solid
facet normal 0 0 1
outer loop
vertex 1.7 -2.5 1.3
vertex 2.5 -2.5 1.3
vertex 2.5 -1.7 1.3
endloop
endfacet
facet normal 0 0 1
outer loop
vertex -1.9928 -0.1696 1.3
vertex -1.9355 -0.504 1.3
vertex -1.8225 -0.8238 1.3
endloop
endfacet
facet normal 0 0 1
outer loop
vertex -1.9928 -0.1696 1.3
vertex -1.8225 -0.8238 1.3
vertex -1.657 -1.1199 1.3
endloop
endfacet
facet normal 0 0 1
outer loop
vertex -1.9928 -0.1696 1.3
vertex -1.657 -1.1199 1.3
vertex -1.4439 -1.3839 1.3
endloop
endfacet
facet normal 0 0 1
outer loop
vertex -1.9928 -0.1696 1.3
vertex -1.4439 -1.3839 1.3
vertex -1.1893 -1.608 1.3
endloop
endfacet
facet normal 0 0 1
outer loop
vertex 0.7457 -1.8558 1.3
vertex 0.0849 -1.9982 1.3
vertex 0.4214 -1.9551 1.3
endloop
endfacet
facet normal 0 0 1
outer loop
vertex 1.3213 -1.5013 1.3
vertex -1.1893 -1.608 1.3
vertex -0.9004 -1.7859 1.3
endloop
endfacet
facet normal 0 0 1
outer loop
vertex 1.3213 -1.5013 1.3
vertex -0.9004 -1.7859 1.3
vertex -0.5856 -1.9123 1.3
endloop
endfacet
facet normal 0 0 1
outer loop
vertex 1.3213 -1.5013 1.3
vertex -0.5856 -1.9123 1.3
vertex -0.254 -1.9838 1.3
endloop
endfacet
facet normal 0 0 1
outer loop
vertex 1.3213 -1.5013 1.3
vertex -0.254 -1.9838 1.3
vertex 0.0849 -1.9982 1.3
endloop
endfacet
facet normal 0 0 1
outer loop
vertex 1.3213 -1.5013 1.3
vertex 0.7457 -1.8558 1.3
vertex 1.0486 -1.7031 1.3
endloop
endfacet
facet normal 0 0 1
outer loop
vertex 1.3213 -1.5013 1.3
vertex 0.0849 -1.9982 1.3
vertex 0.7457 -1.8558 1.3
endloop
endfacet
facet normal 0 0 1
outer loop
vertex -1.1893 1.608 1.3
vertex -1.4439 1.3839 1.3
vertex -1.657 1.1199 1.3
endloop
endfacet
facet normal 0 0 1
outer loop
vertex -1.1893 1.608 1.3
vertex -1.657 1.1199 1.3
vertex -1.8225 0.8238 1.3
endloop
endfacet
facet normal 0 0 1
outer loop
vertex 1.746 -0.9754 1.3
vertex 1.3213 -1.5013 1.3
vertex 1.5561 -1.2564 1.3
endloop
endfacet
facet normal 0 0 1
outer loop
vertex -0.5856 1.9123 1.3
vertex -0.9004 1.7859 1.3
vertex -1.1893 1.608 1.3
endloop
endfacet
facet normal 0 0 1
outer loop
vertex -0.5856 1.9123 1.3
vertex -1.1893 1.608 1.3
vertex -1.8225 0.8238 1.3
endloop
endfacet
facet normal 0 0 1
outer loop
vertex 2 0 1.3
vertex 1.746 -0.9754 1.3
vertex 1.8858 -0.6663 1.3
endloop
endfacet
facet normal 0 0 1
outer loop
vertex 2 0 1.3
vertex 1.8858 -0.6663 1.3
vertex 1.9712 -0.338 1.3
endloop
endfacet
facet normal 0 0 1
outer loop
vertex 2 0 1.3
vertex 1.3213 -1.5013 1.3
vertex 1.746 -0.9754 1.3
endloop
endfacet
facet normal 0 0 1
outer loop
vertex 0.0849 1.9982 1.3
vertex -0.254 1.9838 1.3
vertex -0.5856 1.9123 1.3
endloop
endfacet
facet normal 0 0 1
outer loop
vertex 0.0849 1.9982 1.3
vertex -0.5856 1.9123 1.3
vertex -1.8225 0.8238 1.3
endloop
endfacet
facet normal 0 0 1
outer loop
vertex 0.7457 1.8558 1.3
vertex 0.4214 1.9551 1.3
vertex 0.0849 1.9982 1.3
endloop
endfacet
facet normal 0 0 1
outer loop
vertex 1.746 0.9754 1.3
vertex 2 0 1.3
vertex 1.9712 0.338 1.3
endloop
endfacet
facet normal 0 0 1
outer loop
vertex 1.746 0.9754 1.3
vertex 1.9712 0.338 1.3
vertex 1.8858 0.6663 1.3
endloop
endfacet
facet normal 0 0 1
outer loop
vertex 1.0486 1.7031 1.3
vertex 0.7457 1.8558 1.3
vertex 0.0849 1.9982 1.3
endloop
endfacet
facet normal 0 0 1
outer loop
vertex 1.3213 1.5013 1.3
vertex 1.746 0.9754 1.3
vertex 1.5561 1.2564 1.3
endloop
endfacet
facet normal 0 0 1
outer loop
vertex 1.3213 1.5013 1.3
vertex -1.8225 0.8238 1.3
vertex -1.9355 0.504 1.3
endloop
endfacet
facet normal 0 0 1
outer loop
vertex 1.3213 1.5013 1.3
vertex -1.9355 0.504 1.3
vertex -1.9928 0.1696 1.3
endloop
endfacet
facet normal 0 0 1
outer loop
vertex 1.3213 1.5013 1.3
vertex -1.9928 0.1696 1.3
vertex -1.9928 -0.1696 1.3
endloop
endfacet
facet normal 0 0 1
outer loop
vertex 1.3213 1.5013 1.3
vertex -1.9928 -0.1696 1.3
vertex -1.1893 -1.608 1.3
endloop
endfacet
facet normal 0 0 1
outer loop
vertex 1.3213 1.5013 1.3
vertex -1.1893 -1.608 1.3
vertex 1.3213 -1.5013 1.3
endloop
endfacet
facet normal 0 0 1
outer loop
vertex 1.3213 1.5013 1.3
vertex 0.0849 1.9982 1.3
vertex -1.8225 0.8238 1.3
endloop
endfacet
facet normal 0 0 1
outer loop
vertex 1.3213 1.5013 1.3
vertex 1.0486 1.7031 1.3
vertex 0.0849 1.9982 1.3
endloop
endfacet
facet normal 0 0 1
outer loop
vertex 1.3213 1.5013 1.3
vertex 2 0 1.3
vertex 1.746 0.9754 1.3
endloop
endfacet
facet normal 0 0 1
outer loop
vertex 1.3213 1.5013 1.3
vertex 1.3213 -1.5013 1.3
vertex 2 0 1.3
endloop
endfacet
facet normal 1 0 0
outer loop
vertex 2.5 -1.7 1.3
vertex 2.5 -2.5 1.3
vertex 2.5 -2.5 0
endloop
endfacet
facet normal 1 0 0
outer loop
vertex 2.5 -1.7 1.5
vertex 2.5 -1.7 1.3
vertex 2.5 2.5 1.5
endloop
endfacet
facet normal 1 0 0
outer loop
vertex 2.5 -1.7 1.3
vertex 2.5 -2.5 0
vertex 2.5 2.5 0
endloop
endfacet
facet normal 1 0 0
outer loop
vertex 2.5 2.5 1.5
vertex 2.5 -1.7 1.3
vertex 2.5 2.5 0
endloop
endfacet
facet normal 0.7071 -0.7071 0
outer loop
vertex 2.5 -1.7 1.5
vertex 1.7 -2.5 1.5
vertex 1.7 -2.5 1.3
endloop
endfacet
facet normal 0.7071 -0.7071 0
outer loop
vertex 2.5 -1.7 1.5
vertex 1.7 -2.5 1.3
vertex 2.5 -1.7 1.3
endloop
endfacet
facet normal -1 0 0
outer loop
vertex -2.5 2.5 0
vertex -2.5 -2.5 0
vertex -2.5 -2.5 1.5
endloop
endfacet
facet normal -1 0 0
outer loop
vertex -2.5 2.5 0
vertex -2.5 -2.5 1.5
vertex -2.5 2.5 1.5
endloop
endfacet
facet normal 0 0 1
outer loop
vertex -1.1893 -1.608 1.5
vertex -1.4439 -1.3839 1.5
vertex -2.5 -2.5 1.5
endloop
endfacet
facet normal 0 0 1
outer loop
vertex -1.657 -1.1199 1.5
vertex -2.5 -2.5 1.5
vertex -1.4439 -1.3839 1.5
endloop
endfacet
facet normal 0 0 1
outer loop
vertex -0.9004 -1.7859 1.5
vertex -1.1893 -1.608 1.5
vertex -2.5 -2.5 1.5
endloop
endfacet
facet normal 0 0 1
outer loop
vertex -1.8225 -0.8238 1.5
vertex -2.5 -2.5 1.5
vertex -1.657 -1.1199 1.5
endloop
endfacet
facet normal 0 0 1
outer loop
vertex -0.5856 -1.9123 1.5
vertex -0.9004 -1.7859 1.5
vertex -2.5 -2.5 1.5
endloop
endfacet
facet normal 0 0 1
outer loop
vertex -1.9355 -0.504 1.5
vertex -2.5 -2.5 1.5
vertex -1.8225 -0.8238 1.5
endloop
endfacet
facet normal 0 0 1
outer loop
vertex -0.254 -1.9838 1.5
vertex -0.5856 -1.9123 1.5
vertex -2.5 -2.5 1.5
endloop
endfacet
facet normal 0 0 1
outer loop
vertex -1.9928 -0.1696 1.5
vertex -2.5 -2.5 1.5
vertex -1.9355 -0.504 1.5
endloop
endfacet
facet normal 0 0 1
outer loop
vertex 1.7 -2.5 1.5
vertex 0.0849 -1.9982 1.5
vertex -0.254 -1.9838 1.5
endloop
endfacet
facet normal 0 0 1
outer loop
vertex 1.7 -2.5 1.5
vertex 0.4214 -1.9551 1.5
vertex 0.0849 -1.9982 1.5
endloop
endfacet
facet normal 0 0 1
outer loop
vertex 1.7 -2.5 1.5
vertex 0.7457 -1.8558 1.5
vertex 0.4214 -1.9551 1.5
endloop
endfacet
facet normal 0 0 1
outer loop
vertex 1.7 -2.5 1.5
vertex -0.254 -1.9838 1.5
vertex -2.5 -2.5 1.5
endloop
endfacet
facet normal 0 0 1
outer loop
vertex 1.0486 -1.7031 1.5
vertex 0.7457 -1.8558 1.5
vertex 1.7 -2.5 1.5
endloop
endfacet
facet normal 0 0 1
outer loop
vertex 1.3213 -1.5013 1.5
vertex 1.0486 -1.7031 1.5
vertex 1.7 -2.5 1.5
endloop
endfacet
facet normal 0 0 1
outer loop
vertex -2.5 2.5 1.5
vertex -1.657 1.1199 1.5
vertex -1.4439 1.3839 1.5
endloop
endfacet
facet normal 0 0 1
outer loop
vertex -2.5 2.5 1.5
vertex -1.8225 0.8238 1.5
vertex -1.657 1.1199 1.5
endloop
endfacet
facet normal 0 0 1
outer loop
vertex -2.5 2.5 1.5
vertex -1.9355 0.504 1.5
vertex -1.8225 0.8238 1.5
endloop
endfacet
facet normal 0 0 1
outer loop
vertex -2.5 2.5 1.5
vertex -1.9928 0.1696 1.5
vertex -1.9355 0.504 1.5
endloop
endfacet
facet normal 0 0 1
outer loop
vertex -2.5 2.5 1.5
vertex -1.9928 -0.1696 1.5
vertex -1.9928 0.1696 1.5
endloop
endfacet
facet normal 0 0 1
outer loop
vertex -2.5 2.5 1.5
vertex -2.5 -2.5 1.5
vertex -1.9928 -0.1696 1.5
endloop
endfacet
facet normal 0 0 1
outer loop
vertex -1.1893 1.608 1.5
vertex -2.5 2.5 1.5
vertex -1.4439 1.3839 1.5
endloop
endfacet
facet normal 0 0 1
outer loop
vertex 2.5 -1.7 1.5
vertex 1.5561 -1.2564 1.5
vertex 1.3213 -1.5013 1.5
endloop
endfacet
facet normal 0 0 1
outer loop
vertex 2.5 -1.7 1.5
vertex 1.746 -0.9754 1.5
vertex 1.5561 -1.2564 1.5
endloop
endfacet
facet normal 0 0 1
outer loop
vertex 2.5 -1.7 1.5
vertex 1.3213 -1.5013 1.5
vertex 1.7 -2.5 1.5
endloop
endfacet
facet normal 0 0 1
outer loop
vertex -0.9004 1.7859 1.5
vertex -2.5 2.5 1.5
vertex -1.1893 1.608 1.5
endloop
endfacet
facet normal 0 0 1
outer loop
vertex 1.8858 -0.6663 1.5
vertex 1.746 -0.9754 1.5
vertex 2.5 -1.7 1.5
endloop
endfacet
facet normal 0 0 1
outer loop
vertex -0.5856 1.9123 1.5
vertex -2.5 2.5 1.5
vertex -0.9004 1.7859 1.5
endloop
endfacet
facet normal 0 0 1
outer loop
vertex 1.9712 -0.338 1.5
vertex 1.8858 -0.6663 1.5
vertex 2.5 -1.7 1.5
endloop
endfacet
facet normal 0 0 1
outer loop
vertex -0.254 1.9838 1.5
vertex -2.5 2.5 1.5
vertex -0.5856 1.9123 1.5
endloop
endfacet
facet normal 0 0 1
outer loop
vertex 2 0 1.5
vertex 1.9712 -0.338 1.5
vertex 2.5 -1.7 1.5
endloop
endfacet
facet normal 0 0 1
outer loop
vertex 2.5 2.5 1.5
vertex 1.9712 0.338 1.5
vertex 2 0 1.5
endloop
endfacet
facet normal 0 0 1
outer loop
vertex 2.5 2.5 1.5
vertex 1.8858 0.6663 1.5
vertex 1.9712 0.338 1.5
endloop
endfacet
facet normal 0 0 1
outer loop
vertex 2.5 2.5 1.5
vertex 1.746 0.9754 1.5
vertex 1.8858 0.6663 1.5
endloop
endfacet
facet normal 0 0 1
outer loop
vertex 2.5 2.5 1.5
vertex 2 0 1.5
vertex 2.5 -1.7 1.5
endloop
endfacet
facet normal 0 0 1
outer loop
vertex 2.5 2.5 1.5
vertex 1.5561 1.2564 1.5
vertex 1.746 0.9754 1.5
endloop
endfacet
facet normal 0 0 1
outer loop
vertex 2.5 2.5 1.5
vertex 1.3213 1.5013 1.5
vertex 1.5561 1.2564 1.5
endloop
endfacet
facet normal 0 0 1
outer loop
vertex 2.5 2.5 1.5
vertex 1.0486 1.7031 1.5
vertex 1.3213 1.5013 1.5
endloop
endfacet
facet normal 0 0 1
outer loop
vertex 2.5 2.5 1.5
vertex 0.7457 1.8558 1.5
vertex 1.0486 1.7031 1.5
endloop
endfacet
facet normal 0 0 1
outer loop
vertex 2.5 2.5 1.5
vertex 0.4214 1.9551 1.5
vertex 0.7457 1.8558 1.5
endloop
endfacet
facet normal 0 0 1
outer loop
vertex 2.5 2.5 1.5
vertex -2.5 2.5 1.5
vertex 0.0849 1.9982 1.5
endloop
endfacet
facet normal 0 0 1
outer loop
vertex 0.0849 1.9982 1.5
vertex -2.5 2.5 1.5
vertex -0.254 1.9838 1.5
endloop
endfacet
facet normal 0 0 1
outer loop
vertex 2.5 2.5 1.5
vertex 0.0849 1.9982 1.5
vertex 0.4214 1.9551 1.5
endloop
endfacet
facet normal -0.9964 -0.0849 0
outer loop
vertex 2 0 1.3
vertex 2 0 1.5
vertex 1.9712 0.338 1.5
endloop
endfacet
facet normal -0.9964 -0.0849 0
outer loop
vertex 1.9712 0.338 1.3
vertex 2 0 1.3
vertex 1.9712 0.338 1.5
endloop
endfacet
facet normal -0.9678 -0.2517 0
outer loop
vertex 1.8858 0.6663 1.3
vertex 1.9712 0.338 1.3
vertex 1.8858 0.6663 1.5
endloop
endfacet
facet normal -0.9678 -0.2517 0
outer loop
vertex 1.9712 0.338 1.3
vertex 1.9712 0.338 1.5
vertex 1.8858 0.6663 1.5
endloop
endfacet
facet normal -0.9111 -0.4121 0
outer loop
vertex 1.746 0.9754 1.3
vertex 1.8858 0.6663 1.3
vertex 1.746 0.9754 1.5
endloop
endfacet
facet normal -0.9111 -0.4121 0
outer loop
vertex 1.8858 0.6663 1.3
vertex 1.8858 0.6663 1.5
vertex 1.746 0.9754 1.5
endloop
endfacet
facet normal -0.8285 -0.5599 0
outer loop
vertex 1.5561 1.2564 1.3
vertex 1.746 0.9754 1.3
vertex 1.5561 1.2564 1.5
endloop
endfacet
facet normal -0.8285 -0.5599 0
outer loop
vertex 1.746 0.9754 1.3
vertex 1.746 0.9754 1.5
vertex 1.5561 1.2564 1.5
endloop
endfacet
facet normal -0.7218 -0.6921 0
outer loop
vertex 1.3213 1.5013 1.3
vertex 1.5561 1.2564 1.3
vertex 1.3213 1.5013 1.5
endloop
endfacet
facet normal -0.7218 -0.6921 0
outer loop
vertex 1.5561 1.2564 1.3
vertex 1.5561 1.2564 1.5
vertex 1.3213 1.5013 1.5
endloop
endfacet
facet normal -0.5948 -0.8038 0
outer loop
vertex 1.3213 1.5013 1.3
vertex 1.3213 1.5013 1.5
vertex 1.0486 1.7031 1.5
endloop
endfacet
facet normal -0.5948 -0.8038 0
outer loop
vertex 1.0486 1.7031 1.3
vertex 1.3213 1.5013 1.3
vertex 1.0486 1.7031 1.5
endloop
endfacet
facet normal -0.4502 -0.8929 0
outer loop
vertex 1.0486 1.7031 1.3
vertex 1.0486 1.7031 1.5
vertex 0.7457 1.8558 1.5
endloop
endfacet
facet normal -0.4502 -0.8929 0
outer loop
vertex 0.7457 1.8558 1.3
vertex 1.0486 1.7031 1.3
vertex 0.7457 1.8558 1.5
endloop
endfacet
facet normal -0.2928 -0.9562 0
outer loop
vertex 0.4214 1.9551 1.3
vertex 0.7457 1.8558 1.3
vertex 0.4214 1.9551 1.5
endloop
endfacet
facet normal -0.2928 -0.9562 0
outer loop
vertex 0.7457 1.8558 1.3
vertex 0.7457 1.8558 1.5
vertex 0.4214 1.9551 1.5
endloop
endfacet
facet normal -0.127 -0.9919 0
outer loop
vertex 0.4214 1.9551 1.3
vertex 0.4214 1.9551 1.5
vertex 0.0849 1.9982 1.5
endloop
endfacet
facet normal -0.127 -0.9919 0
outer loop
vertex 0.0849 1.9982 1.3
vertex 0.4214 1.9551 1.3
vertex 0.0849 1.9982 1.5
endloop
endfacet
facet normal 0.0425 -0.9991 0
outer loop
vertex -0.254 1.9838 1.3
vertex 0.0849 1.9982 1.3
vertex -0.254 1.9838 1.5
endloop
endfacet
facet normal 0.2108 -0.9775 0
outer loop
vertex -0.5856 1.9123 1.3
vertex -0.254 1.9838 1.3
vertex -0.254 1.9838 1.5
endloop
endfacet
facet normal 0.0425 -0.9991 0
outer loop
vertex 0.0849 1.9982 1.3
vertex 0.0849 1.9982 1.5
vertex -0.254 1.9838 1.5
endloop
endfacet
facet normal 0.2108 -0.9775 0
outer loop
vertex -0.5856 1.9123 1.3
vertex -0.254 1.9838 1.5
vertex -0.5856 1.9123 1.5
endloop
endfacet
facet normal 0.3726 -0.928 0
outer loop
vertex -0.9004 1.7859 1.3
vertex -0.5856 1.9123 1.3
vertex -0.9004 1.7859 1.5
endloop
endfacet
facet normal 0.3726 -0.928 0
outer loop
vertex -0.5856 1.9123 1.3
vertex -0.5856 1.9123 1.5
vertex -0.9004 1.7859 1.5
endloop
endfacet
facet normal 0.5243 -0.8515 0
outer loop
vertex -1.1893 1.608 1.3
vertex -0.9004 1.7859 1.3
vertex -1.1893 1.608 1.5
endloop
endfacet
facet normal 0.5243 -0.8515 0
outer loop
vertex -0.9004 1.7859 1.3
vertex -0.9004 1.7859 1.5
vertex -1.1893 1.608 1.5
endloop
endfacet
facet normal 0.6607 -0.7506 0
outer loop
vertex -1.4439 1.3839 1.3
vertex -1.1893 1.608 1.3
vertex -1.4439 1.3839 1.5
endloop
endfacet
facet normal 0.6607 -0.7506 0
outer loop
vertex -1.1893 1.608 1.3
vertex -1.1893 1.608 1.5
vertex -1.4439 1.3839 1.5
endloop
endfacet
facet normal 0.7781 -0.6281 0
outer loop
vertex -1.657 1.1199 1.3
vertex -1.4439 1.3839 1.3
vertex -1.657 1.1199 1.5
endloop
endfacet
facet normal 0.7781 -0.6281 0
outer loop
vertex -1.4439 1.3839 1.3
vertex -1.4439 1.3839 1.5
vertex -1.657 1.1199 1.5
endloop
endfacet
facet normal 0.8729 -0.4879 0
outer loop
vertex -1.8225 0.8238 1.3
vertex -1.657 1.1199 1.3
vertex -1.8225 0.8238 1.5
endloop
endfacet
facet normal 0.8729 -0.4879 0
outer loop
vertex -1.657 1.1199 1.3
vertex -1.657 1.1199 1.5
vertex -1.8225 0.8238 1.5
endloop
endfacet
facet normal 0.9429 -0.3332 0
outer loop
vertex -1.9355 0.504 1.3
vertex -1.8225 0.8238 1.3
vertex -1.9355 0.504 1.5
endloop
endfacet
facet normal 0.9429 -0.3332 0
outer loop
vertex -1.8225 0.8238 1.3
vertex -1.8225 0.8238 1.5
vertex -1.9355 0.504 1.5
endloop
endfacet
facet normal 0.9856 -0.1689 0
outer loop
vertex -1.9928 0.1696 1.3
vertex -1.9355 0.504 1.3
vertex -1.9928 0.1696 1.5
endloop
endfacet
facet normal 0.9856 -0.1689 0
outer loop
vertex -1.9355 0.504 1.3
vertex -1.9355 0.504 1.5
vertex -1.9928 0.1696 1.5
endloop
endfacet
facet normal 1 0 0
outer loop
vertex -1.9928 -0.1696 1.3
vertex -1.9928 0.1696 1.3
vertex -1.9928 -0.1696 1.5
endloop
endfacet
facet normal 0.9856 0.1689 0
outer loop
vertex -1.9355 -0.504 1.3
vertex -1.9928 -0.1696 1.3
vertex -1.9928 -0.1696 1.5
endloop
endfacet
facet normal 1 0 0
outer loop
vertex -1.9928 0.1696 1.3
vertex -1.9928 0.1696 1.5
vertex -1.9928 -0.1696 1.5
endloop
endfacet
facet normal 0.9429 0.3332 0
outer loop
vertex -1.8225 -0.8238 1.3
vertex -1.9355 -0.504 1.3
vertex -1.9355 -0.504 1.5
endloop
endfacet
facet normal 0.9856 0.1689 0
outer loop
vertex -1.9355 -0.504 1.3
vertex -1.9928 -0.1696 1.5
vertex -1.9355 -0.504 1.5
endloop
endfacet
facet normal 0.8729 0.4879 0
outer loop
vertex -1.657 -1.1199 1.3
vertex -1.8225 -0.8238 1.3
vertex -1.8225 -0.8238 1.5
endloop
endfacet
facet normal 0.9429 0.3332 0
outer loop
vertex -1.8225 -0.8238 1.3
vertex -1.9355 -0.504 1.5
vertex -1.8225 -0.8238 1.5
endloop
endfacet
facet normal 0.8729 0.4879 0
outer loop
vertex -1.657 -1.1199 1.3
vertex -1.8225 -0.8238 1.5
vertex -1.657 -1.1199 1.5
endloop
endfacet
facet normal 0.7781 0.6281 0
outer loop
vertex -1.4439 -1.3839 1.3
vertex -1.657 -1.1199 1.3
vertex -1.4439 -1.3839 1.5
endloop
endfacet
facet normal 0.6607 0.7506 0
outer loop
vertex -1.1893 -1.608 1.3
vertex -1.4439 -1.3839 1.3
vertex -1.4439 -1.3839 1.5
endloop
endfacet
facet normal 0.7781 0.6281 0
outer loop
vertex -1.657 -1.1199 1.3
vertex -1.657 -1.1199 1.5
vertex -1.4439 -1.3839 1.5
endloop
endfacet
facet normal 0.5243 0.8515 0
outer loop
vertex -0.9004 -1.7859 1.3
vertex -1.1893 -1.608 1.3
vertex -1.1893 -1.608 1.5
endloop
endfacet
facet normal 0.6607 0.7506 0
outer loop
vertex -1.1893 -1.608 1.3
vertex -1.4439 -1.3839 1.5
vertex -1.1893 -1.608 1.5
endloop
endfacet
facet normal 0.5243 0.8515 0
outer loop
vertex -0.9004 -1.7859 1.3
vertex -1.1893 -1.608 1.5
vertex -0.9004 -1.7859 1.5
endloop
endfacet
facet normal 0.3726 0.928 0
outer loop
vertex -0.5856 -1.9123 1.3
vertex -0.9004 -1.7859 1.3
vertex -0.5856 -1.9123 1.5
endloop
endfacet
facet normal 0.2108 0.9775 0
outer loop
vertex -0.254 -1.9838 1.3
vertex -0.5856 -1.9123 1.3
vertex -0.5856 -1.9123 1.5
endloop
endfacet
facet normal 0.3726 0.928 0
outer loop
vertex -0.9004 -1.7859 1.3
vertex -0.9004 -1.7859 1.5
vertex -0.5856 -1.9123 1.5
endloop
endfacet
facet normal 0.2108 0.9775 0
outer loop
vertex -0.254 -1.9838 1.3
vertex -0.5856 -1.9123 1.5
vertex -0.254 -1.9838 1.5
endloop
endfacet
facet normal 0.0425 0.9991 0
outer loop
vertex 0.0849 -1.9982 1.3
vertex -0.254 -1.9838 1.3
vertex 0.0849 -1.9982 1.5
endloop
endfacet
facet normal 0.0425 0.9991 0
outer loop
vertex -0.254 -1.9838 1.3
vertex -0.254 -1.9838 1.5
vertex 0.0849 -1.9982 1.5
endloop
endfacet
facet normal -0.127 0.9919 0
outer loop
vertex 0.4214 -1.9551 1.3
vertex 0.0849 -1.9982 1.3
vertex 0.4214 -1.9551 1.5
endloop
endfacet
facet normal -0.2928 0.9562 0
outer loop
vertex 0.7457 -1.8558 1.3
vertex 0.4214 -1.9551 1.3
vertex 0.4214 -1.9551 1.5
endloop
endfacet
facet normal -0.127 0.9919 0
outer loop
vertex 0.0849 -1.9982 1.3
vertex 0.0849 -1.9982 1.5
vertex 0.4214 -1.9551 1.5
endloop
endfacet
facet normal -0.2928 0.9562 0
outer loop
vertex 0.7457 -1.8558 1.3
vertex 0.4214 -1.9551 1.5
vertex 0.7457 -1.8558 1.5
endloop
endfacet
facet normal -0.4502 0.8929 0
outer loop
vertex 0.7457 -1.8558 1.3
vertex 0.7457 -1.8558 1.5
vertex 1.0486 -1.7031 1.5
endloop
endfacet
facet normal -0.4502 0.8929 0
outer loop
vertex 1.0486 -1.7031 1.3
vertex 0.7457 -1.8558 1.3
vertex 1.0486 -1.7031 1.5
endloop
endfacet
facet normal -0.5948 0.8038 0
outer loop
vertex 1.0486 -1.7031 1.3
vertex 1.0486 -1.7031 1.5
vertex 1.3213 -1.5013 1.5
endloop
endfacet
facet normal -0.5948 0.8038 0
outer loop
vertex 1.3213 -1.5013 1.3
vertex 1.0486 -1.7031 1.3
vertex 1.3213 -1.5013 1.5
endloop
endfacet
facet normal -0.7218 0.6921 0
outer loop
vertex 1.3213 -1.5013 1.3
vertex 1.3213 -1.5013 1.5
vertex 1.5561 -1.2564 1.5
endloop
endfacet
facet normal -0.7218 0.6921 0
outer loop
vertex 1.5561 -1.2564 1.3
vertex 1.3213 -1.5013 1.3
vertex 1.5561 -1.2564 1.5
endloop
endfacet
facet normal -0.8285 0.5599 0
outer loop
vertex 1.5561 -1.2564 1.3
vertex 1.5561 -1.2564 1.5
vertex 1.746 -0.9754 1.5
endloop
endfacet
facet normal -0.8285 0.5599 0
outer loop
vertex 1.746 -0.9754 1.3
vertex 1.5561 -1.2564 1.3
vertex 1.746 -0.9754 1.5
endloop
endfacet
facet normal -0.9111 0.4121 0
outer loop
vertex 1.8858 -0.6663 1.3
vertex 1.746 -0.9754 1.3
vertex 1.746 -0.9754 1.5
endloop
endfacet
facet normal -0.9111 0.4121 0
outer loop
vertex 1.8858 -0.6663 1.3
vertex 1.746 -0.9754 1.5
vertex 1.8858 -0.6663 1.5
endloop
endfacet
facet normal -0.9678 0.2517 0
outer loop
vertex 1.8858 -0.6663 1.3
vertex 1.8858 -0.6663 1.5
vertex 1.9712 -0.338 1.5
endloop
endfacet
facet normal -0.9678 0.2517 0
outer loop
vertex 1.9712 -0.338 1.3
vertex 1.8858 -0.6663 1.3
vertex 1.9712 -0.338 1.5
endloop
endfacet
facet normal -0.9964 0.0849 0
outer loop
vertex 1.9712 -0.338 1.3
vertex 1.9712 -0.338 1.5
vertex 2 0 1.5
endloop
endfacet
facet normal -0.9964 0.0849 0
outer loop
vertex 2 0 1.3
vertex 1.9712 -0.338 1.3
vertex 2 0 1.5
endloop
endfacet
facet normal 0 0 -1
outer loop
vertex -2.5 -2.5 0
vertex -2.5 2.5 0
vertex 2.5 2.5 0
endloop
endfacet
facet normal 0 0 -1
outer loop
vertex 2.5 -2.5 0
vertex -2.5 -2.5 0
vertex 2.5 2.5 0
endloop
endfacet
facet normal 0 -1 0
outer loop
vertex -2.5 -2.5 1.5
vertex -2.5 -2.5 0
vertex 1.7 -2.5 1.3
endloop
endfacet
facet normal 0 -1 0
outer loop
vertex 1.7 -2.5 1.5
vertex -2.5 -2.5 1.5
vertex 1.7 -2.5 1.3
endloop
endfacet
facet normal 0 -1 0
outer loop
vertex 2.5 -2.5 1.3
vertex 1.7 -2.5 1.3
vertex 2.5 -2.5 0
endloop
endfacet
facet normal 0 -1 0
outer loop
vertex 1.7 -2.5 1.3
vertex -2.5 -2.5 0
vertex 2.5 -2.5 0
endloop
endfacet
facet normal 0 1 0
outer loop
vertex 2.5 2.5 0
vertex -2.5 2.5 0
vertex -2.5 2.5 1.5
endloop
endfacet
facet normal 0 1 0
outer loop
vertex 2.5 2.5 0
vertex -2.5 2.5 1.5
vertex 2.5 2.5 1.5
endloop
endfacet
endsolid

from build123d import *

# Parameters (mm, degrees)
SKETCH_1_W          = 5
SKETCH_1_H          = 5
EXTRUDE_1_DEPTH     = 1.5
SKETCH_2_R          = 2
CUT_EXTRUDE_1_DEPTH = 0.2


with BuildPart() as part:
    # Эскиз1 → Бобышка-Вытянуть1 (new body)
    with BuildSketch(Plane.XY):
        Rectangle(SKETCH_1_W, SKETCH_1_H)
    extrude(amount=EXTRUDE_1_DEPTH)

    # Эскиз2 → Вырез-Вытянуть1 (cut)
    with BuildSketch(Plane.XY.offset(1.5)):
        Circle(SKETCH_2_R)
        Polygon((2.5, -2.5), (1.7, -2.5), (2.5, -1.7), align=None)
    extrude(amount=-CUT_EXTRUDE_1_DEPTH, mode=Mode.SUBTRACT)


solid = part.part
